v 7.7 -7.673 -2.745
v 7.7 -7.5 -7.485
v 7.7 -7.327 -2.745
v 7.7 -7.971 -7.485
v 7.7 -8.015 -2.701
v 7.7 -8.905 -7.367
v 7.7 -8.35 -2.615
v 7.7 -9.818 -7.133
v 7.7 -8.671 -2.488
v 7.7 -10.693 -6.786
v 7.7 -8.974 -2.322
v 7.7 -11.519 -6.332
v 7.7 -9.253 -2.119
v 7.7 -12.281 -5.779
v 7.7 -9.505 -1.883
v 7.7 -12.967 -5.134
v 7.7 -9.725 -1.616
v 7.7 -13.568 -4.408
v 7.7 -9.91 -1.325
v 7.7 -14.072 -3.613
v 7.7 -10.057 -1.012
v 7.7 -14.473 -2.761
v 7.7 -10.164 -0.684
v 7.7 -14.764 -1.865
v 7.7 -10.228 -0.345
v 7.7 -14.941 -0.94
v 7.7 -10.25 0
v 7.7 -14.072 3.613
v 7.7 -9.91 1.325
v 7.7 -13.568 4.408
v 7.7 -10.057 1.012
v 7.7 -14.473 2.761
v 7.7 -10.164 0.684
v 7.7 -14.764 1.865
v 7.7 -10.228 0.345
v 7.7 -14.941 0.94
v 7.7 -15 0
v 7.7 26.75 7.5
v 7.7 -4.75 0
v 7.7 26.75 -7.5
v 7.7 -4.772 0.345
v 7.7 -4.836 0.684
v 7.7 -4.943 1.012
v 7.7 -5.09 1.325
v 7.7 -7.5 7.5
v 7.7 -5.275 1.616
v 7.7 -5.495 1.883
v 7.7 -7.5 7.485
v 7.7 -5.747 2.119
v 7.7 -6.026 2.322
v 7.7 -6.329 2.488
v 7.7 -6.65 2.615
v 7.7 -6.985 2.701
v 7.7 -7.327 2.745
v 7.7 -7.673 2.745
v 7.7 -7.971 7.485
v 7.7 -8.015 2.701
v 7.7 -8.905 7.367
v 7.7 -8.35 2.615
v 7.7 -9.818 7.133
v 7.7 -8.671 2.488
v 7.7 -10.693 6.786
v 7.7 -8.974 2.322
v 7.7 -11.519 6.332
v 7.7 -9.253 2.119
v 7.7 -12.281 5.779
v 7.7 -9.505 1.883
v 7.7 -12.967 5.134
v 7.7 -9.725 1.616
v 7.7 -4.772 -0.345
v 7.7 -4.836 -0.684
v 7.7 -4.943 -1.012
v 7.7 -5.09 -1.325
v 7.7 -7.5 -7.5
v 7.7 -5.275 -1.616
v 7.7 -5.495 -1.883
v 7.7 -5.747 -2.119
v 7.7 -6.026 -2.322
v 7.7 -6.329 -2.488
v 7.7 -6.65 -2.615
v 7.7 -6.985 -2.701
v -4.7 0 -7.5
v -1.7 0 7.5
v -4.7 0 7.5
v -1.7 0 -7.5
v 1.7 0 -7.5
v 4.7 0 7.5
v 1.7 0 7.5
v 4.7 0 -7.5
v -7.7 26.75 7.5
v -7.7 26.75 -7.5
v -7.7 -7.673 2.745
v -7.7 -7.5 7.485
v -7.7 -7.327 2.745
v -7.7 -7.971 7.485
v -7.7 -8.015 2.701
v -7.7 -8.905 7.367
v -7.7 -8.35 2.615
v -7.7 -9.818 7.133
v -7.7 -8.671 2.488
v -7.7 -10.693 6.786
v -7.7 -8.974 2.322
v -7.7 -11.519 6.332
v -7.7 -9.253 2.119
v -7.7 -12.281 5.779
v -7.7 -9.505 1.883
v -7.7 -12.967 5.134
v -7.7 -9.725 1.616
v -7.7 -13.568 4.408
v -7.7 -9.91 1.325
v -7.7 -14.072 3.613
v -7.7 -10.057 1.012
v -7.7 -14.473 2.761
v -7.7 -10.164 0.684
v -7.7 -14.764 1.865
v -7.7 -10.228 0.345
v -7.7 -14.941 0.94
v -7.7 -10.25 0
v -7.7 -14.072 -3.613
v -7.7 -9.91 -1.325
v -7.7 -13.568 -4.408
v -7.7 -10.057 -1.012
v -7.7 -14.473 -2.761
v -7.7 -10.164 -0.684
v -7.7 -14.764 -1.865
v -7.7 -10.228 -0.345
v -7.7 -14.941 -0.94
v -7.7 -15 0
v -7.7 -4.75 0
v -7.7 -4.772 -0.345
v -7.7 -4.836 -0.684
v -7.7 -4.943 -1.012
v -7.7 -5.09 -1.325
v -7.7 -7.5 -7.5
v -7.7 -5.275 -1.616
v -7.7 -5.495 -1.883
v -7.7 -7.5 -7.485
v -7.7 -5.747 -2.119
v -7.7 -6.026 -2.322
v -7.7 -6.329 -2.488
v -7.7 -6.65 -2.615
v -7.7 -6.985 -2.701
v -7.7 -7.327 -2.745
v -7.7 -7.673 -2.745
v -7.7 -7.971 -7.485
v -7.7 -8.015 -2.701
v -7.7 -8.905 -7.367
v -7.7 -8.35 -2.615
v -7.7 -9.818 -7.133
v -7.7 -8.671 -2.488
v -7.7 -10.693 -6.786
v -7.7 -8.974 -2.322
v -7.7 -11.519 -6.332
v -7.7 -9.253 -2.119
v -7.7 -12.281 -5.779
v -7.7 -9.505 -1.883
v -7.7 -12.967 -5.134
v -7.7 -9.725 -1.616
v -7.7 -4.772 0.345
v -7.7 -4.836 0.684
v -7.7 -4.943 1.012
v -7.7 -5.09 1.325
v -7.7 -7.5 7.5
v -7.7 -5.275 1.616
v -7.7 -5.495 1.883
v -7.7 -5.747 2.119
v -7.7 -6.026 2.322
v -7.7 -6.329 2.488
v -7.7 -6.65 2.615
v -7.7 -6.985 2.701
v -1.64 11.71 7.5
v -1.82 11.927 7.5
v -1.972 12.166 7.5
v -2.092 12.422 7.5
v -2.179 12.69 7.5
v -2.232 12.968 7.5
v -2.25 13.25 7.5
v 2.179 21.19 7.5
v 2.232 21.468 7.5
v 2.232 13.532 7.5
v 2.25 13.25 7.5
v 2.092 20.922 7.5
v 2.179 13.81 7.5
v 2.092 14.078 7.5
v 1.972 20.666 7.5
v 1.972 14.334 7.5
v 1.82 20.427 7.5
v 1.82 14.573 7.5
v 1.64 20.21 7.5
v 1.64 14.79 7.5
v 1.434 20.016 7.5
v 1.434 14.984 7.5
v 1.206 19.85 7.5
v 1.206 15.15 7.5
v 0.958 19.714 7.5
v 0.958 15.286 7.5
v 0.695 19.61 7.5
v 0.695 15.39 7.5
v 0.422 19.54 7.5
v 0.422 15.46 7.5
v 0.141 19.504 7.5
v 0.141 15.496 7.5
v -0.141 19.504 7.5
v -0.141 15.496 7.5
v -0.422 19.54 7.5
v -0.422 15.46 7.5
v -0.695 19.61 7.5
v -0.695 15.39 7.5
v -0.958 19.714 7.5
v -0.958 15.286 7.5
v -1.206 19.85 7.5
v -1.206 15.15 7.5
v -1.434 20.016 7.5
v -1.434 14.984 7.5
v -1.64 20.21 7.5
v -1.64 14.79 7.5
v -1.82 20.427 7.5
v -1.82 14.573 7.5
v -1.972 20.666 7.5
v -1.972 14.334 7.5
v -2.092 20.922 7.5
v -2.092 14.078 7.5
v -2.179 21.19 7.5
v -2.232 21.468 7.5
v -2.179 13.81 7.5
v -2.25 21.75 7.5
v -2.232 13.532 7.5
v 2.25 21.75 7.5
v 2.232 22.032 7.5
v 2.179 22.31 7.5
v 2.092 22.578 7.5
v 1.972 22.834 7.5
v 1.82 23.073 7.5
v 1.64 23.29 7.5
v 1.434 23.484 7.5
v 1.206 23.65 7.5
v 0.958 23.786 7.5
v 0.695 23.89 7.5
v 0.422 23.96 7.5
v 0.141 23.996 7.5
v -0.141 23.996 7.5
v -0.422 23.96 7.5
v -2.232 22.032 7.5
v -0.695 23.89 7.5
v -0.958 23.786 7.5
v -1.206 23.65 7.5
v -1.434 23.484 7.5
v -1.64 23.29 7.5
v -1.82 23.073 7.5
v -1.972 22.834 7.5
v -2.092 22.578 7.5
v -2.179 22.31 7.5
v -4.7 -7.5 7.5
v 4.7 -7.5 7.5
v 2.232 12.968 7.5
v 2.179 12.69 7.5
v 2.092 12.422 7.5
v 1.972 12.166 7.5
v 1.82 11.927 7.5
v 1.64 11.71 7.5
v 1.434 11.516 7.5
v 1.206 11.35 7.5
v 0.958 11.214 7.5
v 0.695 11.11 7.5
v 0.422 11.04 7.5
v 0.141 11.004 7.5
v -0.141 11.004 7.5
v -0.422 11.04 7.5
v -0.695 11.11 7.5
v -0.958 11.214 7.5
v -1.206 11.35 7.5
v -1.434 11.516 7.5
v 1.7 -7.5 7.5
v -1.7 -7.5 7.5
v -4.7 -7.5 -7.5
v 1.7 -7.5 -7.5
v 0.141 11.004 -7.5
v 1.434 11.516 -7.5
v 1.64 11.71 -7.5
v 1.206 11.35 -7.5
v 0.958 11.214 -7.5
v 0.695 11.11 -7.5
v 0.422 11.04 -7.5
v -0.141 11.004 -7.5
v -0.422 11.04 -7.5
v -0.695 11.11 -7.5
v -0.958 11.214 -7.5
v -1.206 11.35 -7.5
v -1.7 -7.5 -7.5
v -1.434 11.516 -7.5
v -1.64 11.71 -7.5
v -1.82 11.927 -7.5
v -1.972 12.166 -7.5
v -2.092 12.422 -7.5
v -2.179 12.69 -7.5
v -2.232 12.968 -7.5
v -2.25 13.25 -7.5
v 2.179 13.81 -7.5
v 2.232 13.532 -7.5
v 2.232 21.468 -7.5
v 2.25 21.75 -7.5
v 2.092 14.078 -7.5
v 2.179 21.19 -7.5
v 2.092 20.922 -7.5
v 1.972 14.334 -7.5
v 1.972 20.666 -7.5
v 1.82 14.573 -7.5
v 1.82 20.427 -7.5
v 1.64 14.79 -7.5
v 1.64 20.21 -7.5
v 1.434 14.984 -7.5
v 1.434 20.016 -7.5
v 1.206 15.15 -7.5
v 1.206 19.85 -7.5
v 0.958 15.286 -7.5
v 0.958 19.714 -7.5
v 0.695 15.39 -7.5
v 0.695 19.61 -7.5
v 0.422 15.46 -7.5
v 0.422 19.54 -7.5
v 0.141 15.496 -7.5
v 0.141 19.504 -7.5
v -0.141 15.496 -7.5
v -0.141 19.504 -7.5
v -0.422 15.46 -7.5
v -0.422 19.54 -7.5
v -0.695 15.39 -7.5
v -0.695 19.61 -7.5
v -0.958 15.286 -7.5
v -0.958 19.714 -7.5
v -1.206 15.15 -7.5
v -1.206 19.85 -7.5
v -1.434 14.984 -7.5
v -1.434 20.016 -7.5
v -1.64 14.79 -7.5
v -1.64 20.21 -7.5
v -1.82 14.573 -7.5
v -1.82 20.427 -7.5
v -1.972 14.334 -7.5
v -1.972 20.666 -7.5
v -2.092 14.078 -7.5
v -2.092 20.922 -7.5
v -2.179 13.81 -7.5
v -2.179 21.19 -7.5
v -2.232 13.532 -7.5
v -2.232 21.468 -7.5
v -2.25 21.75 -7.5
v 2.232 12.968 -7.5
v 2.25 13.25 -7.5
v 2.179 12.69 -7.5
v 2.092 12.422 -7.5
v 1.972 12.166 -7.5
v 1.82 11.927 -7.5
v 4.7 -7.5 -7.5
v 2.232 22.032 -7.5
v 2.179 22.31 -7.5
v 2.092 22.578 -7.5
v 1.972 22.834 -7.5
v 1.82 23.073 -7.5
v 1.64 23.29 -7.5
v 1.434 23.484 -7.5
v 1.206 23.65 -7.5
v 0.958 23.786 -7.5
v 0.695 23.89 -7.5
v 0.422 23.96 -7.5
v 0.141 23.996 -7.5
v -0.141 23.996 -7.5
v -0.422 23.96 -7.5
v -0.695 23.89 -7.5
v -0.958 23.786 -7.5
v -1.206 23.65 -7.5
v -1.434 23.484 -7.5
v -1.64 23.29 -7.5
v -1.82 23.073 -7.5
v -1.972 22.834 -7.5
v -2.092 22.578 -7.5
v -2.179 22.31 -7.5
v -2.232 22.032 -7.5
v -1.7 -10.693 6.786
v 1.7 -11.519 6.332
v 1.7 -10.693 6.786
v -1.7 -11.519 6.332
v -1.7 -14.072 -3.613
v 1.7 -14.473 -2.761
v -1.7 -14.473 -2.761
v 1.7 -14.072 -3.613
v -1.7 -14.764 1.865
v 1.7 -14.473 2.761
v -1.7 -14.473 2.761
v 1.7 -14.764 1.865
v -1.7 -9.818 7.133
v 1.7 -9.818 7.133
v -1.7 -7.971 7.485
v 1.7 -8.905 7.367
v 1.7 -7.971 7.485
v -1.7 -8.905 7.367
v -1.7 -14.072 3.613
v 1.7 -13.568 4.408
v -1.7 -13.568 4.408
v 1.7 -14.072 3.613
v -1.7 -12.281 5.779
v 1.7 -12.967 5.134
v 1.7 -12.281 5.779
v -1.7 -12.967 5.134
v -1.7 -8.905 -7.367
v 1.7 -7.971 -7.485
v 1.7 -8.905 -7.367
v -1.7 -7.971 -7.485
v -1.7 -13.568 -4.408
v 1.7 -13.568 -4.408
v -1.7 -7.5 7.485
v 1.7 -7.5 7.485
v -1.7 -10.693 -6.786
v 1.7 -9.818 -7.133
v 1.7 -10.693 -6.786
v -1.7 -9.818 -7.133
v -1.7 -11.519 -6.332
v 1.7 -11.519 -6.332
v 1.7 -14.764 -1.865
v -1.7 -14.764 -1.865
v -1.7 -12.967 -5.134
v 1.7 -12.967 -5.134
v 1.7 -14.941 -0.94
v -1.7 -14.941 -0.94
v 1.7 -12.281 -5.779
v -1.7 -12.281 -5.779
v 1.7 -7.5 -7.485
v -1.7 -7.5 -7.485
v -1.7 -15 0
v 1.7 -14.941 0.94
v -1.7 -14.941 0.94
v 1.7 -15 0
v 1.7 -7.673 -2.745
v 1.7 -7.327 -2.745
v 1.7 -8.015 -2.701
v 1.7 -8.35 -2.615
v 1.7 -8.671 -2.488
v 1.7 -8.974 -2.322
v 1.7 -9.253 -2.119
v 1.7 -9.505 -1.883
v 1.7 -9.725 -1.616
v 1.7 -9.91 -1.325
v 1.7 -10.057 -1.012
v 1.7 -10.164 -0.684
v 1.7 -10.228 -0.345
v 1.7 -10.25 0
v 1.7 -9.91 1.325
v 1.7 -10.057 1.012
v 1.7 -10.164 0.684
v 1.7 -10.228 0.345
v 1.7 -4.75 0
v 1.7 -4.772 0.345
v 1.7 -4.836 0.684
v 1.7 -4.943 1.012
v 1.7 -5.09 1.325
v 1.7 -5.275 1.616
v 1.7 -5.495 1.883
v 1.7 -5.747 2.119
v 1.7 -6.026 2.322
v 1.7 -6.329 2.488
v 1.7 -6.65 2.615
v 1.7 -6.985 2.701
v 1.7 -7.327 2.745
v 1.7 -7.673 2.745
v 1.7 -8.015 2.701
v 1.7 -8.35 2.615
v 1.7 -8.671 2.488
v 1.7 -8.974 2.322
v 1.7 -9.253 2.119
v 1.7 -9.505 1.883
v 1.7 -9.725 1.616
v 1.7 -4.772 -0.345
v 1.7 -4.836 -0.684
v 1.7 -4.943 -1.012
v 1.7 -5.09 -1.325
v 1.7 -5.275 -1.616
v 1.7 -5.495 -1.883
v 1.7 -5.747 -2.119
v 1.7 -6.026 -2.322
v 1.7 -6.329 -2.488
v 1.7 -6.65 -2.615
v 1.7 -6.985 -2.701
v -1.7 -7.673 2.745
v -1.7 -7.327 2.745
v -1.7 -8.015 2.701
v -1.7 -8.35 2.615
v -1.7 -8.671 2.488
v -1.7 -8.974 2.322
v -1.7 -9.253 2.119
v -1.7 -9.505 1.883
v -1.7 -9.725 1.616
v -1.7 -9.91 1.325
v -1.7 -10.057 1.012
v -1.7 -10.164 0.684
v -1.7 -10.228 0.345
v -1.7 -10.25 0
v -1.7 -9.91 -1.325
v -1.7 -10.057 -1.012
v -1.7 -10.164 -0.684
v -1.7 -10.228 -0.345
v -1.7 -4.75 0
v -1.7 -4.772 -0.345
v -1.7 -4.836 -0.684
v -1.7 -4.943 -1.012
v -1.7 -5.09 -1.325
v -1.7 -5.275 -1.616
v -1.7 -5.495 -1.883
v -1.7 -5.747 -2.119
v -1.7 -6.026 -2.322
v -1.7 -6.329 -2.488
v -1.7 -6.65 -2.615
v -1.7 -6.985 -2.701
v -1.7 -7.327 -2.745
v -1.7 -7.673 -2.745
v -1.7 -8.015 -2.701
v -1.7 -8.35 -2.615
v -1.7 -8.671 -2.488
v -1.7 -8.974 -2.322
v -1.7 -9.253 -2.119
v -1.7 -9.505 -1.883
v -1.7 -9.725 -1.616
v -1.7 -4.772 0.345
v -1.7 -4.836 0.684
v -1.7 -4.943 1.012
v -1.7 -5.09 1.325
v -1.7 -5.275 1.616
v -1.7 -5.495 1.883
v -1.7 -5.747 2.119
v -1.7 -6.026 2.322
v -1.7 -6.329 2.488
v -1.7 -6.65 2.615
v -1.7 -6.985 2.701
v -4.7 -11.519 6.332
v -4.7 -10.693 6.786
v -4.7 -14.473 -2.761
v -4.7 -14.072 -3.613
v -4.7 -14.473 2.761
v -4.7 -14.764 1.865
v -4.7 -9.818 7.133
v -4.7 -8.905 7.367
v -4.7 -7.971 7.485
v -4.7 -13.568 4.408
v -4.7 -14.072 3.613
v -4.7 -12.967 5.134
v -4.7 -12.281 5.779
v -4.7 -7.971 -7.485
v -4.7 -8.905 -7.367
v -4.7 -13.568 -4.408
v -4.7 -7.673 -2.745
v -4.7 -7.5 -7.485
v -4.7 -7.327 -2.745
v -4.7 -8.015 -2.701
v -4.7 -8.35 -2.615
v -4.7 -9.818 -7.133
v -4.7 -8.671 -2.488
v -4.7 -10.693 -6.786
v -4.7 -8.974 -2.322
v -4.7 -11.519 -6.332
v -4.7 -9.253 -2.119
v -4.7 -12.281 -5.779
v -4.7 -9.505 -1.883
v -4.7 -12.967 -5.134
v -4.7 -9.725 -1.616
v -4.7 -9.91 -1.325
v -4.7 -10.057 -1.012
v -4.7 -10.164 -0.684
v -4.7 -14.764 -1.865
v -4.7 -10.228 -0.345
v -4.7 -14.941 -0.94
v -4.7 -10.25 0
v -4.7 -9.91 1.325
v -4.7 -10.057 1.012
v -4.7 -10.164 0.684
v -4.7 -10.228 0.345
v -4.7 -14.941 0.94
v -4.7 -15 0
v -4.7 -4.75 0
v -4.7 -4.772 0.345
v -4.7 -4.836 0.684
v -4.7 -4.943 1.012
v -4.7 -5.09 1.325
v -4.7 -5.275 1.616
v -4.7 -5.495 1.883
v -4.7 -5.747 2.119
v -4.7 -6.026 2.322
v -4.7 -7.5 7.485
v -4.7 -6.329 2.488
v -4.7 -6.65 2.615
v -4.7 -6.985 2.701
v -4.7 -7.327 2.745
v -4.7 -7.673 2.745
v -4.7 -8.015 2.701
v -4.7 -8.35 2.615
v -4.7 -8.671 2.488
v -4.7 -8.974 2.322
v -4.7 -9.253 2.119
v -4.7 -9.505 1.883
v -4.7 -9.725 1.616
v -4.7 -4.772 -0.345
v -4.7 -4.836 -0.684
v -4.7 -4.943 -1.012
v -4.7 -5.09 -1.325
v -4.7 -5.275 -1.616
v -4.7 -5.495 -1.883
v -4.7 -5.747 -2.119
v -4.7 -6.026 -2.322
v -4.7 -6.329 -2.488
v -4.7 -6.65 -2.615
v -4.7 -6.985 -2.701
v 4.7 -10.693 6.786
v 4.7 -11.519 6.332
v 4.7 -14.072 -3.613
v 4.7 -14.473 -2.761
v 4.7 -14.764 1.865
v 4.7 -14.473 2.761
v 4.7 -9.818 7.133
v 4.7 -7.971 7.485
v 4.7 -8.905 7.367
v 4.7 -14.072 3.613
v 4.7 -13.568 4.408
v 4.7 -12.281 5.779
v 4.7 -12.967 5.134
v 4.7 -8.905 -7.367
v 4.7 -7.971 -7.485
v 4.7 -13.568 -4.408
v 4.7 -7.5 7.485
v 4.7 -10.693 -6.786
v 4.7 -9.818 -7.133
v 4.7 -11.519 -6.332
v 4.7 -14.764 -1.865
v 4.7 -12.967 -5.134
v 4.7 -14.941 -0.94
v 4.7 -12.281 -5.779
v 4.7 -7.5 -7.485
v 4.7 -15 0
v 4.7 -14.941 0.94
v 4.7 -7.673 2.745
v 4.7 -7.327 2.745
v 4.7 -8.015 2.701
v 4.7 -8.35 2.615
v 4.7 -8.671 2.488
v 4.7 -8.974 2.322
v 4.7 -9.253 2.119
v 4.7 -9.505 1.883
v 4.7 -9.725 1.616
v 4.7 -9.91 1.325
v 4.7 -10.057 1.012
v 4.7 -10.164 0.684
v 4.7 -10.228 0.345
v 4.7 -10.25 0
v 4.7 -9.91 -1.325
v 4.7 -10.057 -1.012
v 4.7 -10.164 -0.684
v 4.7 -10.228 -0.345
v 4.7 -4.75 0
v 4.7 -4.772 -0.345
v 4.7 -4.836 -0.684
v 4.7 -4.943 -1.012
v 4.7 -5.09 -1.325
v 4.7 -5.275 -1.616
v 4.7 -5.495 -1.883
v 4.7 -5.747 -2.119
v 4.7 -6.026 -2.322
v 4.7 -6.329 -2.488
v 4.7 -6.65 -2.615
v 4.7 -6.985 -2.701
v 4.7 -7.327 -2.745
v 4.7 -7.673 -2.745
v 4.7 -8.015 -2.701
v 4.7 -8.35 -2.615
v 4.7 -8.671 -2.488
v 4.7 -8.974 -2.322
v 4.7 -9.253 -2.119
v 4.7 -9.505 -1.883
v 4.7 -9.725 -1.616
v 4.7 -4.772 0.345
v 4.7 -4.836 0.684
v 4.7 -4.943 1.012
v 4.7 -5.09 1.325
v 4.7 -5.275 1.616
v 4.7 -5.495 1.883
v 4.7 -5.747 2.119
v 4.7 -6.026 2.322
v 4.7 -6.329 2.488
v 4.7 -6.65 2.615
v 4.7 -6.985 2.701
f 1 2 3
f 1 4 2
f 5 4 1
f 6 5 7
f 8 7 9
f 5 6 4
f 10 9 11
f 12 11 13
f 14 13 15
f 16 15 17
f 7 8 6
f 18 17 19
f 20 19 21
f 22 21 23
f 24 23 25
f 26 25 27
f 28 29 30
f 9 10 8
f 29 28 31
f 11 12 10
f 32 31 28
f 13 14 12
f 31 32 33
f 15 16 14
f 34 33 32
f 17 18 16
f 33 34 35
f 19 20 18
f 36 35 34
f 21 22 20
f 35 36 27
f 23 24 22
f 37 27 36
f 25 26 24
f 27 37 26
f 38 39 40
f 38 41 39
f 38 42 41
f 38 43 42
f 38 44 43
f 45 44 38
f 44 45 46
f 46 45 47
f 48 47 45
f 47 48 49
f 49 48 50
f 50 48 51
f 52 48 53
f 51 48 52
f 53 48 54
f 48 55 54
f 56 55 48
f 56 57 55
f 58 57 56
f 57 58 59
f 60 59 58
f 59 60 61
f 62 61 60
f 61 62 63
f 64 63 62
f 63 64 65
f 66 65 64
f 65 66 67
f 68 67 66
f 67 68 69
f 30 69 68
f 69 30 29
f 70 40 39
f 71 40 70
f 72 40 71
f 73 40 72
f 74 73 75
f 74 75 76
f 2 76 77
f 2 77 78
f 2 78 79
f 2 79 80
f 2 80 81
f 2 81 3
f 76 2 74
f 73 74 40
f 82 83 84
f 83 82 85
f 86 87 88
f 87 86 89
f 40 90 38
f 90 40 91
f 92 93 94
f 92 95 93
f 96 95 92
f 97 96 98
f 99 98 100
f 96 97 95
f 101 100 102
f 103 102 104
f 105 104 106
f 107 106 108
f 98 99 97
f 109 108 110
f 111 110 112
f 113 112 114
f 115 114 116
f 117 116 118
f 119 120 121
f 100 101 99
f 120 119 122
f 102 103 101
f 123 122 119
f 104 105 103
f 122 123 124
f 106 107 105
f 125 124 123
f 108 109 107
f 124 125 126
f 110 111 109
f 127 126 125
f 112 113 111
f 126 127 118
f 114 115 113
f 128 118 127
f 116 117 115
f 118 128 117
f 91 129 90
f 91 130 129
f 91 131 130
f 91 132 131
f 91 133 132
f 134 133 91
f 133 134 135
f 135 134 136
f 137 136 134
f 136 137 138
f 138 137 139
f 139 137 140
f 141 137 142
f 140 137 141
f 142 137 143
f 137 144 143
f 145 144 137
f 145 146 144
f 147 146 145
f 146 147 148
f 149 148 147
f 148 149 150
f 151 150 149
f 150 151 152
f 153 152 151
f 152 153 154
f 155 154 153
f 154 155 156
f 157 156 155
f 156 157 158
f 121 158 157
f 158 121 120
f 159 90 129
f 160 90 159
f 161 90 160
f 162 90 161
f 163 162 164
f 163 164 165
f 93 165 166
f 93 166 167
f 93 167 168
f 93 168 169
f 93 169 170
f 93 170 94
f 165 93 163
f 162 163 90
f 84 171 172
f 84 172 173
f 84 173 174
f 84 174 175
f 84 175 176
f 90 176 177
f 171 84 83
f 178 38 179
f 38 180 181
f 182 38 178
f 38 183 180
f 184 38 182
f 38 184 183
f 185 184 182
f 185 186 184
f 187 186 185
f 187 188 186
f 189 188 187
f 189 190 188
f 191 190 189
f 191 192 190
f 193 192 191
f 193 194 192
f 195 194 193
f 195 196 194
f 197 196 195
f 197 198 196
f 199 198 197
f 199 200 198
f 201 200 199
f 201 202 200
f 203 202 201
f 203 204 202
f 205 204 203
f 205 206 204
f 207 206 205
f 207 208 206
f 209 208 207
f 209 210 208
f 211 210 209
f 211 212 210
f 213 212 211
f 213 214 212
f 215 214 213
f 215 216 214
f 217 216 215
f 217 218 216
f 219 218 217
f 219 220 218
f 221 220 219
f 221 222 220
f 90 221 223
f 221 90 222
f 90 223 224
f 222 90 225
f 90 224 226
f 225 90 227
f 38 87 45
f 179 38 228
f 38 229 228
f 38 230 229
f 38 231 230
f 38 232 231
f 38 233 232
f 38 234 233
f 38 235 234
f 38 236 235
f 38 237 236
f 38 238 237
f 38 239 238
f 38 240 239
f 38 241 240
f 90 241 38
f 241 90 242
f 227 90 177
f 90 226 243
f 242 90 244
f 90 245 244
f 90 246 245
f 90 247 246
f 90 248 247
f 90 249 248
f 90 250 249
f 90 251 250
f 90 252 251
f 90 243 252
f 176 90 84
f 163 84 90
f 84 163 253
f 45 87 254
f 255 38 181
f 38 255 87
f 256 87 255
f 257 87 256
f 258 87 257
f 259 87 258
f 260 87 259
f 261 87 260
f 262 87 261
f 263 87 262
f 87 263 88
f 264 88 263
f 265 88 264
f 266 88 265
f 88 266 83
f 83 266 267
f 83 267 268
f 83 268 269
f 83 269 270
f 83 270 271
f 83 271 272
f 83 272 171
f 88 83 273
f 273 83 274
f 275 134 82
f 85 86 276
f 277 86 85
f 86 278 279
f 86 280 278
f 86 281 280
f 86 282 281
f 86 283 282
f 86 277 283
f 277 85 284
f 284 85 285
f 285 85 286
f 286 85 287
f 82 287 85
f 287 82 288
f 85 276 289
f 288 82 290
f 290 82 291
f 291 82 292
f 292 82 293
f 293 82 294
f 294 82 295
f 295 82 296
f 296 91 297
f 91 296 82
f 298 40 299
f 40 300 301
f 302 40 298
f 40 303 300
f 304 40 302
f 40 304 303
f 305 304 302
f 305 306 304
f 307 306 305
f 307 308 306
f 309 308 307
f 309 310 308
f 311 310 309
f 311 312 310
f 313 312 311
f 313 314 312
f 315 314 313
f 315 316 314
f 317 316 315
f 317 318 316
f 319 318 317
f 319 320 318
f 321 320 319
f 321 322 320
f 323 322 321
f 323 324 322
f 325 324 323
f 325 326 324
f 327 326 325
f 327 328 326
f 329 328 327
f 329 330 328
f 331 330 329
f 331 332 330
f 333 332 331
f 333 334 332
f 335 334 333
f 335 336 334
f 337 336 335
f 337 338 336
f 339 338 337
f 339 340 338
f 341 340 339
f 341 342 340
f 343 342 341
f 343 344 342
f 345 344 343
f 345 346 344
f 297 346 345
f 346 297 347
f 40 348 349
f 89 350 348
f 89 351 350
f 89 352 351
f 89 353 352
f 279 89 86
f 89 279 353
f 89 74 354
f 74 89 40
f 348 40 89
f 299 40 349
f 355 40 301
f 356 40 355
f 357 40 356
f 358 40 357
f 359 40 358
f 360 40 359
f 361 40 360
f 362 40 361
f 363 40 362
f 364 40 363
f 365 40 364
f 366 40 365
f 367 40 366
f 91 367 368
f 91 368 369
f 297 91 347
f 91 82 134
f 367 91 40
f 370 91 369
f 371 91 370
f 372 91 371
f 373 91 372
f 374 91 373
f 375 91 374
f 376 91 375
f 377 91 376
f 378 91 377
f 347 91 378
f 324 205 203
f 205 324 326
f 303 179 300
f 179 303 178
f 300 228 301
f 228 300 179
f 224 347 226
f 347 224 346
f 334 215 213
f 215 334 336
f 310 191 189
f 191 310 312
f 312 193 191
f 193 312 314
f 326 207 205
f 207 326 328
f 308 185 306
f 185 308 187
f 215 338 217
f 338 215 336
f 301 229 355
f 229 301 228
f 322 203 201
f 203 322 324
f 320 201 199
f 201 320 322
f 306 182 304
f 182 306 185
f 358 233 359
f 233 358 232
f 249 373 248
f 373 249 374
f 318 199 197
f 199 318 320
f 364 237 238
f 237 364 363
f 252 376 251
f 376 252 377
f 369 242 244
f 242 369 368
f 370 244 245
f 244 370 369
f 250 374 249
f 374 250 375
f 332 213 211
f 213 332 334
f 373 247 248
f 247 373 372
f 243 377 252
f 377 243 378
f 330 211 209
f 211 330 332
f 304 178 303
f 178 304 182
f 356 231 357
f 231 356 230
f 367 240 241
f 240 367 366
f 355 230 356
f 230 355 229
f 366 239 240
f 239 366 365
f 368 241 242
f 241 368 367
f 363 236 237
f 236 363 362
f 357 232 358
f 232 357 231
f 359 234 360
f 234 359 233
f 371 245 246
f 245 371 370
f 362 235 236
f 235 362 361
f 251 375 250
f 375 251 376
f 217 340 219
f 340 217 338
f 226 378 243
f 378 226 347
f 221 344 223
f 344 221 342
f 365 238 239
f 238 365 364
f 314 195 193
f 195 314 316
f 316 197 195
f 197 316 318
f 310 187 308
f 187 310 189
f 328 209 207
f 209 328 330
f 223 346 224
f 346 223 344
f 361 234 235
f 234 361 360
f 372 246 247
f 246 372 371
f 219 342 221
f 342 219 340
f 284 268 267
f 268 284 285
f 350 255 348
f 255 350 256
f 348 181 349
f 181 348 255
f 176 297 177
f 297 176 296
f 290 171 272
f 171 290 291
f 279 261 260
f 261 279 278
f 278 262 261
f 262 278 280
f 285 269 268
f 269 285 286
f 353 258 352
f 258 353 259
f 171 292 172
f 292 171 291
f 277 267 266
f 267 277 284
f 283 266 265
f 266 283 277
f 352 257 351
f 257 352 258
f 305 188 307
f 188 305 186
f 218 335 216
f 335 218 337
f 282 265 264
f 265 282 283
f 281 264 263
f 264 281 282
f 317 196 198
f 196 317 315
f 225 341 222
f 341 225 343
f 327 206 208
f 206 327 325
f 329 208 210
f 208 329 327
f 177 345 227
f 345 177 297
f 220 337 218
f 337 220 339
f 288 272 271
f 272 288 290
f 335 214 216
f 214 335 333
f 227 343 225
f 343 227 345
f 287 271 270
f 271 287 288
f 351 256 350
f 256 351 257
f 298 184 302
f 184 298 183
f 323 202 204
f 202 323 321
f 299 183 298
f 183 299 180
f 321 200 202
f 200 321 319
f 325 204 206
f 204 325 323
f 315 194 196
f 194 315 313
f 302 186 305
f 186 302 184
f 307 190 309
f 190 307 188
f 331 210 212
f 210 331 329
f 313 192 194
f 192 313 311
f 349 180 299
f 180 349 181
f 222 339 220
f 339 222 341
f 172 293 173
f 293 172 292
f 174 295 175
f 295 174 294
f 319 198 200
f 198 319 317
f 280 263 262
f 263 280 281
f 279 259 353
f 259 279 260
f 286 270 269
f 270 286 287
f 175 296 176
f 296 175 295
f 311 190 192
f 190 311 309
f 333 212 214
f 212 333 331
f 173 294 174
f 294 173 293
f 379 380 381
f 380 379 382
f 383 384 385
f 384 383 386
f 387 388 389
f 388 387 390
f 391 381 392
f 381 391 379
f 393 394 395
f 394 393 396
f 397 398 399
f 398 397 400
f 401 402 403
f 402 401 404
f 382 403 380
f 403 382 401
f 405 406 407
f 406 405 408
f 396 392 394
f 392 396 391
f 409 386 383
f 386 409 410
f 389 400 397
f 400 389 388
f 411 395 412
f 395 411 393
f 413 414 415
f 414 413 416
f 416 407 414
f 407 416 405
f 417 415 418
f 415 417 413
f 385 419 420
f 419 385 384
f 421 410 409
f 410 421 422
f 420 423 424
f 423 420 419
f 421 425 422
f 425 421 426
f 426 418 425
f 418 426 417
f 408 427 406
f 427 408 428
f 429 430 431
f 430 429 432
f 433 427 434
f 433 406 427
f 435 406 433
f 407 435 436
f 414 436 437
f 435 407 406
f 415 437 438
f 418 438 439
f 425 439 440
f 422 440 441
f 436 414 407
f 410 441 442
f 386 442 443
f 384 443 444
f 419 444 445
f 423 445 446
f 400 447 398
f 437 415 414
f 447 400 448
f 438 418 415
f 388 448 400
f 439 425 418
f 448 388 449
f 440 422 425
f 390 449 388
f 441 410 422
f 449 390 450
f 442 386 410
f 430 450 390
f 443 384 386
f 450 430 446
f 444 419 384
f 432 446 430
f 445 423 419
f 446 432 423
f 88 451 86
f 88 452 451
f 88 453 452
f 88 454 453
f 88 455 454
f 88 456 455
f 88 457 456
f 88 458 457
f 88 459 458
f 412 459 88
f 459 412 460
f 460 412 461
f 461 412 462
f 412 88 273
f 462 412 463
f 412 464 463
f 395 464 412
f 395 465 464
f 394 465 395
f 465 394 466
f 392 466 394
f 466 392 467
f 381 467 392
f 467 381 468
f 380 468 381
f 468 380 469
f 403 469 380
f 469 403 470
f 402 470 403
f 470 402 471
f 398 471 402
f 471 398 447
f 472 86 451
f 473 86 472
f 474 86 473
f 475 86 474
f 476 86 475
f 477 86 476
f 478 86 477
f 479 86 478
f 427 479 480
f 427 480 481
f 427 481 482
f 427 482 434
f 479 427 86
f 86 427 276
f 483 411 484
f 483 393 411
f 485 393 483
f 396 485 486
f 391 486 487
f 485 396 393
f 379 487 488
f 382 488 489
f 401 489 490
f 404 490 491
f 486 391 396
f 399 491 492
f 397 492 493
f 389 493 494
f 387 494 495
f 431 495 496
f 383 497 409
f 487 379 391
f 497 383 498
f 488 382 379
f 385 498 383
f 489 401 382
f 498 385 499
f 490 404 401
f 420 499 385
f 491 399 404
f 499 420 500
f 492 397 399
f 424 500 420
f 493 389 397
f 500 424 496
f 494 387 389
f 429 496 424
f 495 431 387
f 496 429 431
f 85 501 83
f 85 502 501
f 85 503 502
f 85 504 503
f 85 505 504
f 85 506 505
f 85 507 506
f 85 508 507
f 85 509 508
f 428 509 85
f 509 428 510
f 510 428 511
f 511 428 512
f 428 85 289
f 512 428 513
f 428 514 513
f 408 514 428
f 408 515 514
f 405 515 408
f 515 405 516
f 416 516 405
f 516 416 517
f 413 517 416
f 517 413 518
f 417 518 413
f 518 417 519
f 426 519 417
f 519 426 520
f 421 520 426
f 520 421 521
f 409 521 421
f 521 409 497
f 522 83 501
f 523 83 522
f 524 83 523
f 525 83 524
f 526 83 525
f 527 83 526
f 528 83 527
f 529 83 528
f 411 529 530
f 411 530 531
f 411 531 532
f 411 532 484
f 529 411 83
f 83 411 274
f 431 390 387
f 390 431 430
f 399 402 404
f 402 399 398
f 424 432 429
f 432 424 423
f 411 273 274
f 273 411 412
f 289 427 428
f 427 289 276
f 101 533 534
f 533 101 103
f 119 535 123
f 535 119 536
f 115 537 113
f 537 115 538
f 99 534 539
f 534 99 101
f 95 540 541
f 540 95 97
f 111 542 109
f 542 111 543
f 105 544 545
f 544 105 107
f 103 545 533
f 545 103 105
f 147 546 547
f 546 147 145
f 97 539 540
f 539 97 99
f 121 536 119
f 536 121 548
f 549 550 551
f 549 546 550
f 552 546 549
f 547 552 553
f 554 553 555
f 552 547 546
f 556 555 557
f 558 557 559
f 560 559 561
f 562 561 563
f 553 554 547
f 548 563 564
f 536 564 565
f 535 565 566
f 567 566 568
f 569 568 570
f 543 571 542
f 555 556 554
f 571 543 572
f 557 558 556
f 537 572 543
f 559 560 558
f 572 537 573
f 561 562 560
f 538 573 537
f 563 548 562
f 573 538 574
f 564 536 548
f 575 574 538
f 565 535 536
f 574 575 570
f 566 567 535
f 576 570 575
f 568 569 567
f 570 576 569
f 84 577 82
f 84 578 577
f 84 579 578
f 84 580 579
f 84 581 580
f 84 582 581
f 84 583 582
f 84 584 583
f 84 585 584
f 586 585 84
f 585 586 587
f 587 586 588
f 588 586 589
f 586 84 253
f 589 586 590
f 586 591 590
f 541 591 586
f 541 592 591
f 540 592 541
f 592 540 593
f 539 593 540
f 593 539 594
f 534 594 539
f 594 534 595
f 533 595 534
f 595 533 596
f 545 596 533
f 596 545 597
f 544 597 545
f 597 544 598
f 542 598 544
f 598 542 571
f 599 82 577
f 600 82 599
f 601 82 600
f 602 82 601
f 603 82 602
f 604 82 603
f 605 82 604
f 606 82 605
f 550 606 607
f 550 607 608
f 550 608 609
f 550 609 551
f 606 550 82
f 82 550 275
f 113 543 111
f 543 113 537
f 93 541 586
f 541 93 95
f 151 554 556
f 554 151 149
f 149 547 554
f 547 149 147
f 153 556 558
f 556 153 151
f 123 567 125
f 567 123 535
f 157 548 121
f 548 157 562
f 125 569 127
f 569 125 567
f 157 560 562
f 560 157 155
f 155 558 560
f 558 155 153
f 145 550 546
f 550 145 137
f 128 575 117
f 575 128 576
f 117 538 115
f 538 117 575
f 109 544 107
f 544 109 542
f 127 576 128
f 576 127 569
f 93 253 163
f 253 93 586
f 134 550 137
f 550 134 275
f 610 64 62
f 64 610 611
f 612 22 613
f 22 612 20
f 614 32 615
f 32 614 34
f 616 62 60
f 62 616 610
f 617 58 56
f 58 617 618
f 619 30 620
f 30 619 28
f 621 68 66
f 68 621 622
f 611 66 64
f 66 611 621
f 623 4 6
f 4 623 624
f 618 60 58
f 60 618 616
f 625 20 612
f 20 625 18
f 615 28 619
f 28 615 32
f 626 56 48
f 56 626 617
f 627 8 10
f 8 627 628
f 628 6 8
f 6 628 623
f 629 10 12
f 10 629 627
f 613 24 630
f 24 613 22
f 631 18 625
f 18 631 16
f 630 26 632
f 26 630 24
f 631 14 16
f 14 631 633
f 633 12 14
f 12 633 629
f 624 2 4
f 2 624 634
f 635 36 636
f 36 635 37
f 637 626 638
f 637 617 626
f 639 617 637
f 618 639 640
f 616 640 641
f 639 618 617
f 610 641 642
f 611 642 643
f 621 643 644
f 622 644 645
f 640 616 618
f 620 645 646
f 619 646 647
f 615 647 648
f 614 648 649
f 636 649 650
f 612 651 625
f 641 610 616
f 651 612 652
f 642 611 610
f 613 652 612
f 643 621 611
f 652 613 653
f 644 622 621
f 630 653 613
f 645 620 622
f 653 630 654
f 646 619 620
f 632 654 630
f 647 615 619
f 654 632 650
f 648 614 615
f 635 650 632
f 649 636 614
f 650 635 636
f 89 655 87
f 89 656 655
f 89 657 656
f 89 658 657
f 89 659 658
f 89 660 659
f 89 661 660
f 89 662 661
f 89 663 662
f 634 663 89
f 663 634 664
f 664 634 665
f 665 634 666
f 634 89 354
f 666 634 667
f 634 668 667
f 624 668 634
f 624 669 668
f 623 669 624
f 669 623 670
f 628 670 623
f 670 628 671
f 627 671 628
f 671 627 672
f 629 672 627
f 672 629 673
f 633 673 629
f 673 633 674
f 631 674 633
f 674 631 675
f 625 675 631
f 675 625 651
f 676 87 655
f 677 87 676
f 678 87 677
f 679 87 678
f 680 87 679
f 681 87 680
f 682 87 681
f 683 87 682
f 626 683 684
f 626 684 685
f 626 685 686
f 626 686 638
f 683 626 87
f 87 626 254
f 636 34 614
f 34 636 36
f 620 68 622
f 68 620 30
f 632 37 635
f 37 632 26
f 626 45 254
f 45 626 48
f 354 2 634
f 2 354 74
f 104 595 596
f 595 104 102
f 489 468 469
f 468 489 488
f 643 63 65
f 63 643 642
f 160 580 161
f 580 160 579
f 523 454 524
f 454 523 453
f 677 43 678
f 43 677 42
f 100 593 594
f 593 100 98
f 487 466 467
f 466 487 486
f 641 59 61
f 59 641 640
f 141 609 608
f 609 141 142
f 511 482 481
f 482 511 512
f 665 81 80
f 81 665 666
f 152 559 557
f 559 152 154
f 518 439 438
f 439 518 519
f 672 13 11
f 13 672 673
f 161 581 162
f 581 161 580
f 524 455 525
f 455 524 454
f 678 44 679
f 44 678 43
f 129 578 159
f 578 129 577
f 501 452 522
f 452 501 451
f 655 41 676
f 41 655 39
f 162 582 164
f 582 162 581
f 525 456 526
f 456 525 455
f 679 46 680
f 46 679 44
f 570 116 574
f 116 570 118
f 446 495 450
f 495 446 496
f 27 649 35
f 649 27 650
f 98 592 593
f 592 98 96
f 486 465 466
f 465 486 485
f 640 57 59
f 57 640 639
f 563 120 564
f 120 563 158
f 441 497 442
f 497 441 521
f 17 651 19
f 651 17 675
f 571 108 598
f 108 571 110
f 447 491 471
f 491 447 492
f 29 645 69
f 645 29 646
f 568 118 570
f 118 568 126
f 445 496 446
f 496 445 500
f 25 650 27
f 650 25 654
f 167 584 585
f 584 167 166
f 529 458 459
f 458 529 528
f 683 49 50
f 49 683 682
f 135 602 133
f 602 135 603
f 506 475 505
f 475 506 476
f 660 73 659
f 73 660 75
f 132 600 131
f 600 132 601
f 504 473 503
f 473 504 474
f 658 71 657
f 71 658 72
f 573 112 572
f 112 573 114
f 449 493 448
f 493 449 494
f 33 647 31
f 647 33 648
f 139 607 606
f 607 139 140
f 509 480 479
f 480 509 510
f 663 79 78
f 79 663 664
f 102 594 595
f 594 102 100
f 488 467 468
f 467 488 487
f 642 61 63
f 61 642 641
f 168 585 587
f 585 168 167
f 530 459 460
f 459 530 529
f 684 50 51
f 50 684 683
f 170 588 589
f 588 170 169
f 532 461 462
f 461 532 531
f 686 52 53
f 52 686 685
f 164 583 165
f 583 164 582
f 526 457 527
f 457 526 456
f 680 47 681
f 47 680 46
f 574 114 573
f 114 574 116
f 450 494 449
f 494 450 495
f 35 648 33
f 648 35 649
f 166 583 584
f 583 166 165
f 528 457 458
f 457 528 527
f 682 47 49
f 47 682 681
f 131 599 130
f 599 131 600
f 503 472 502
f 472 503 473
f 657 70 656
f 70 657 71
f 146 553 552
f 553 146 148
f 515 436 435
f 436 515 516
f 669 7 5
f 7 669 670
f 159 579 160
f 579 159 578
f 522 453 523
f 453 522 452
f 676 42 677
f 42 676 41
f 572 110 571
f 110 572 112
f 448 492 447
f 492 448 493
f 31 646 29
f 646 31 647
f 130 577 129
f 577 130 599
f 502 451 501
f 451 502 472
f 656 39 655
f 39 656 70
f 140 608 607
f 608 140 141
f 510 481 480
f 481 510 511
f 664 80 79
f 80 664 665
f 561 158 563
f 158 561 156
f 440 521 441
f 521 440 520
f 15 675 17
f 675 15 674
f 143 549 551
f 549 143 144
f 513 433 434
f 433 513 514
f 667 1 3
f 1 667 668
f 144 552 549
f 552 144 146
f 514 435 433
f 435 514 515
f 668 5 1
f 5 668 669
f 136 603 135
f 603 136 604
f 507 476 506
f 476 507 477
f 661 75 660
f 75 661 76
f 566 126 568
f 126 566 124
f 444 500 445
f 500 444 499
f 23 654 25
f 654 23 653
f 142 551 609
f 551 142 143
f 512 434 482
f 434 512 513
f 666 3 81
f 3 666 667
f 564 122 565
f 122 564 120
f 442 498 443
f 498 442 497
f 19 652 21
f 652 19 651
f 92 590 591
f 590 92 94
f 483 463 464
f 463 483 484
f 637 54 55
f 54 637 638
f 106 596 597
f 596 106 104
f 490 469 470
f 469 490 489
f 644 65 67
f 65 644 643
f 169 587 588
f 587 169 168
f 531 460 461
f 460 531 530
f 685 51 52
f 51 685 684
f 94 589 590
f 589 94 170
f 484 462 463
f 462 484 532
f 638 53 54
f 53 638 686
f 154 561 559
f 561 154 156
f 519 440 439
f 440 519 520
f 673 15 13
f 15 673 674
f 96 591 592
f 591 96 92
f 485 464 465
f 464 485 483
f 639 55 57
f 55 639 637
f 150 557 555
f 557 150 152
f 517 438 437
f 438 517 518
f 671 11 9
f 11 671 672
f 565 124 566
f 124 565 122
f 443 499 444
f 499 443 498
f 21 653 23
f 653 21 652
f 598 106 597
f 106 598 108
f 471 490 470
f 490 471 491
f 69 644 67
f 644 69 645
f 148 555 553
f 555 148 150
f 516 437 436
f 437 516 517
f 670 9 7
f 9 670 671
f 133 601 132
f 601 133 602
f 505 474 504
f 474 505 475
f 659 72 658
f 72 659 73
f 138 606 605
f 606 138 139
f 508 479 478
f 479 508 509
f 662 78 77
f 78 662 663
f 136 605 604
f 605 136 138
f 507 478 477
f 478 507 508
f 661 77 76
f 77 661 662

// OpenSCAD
//**********************************************************************************************
//This is my attempt at a GoPro3 mount for my Quadcopter (Dualsky Hornet 460)
//It has been designed to be printable without support and strong
//By specifying the extrusion width you will be printing and setting perimeters to 3 (in slic3r)
//printing will be pretty quick.
//**********************************************************************************************

$fn=50;

//layer height used when printing
layerHeight=.3;

//extrusionwidth to use when printing
extrusionWidth=.7;

//Camera Dimensions
//I have added 2mm to camera dimensions to allow for padding
//to be inserted
cameraLength=61;
cameraWidth=23;
cameraHeight=43;
cameraLenseHeight=8;
cameraLenseDiameter=25;

//located 27.5mm from the bottom and 44.5mm from the left edge	 on my gopro3
lenseXOffset=-(44.5-cameraLength/2);
lenseZOffset=28-cameraHeight/2;

//Base to be mounted on top plate of hornet 469. Not used but may need it in future on
baseSupportDiameter=10;
baseSupportHeight=10;
baseSupportScrewDiameter=4.5;
	
//Thickness of walls. Increase to make stronger
wallThickness=4*extrusionWidth;

//Dimensions for GoPro hinge
hingeDiameter=15;
hingeThickness=3;
hingeGap=3.4;
hingeBoltDiameter=5.5;
hingeYOffset=(cameraWidth+2*wallThickness-hingeDiameter)/2;
	
//Back door securing tab dimensions
tabDiameter=10;
tabScrewDiameter=3.5;	
RHStabOffset=10;

//Arm to attach gopro mount to hornet 460
bracketLength=25;
bracketHoleSpacing=8.5;
bracketScrewDiameter=4.5;

//Opening for USB plug (for FPV)
usbPlugLength=wallThickness+.1;
usbPlugWidth=15;
usbPlugHeight=13;

tolerance=.0001;

//model of camera
module hero3()
{
	//body of camera
	cube([cameraLength,cameraWidth,cameraHeight],true);

	//lense of camera
	translate([lenseXOffset,cameraWidth/2,lenseZOffset])
	rotate([-90,0,0])
	cylinder(cameraLenseHeight,cameraLenseDiameter/2,cameraLenseDiameter/2);
}

//space needed for usb plug
module usbPlugCutout()
{
	//	rotate([180,0,0])s
	//usb plug locate 5mm from front and 10mm from bottom
	translate([-cameraLength/2-usbPlugLength/2,-(usbPlugWidth/2-cameraWidth/2+3),10-cameraHeight/2])
	cube([usbPlugLength,usbPlugWidth,usbPlugHeight],true);
}

module mountingBracket()
{
	difference()
	{
		//main shaft	
		translate([0,0,-(bracketLength-hingeDiameter/2+bracketHoleSpacing/2+5)/2])
		cube([hingeThickness*4+hingeGap,hingeDiameter,bracketLength-hingeDiameter/2+bracketHoleSpacing/2+5],true);
	
		//minus mounting screws
		translate([0,0,-(bracketLength-hingeDiameter/2+bracketHoleSpacing/2)])
		rotate([90,0,0])
		cylinder(hingeDiameter+tolerance,bracketScrewDiameter/2,bracketScrewDiameter/2,true);

		translate([0,0,-(bracketLength-hingeDiameter/2-bracketHoleSpacing/2)])
		rotate([90,0,0])
		cylinder(hingeDiameter+tolerance,bracketScrewDiameter/2,bracketScrewDiameter/2,true);

	}	

	difference()
	{
		union()
		{
				//hinge cylinder middle
				translate([0,0,hingeDiameter/2])	
				rotate([0,90,0])
				cylinder(hingeGap,hingeDiameter/2,hingeDiameter/2,true);

				//hinge cylinder bottombit middle
				translate([0,0,hingeDiameter/4])
				cube([hingeGap,hingeDiameter,hingeDiameter/2],true);

				//hinge cylinder RHS
				translate([-(hingeThickness*2+(hingeGap-hingeThickness)/2),0,hingeDiameter/2])	
				rotate([0,90,0])
				cylinder(hingeThickness,hingeDiameter/2,hingeDiameter/2,true);

				//hinge cylinder bottombit RHS
				translate([-(hingeThickness*2+(hingeGap-hingeThickness)/2),0,hingeDiameter/4])
				cube([hingeThickness,hingeDiameter,hingeDiameter/2],true);

				//hinge cylinder LHS
				translate([(hingeThickness*2+(hingeGap-hingeThickness)/2),0,hingeDiameter/2])	
				rotate([0,90,0])
				cylinder(hingeThickness,hingeDiameter/2,hingeDiameter/2,true);

				//hinge cylinder bottombit LHS
				translate([(hingeThickness*2+(hingeGap-hingeThickness)/2),0,hingeDiameter/4])
				cube([hingeThickness,hingeDiameter,hingeDiameter/2],true);
		}
		//minus screw hole
		translate([0,0,hingeDiameter/2])
		rotate([0,90,0])
		cylinder(hingeThickness*4+hingeGap+tolerance,hingeBoltDiameter/2,hingeBoltDiameter/2,true);

	}//difference
}
module hinge()
{
	translate([(lenseXOffset),wallThickness,cameraHeight/2+wallThickness])
	{
	
		difference()
		{
			union()
			{
				//hinge cylinder LHS
				translate([hingeThickness/2+hingeGap/2,-hingeYOffset,hingeDiameter/2])	
				rotate([0,90,0])
				cylinder(hingeThickness,hingeDiameter/2,hingeDiameter/2,true);

				//hinge cylinder bottombit LHS
				translate([hingeThickness/2+hingeGap/2,-hingeYOffset,hingeDiameter/4])
				cube([hingeThickness,hingeDiameter,hingeDiameter/2],true);

				//hinge cylinder RHS
				translate([-(hingeThickness/2+hingeGap/2),-hingeYOffset,hingeDiameter/2])	
				rotate([0,90,0])
				cylinder(hingeThickness,hingeDiameter/2,hingeDiameter/2,true);

				//hinge cylinder bottombit RHS
				translate([-(hingeThickness/2+hingeGap/2),-hingeYOffset,hingeDiameter/4])
				cube([hingeThickness,hingeDiameter,hingeDiameter/2],true);
			}

		translate([0,-hingeYOffset,hingeDiameter/2])
		rotate([0,90,0])
		cylinder(hingeThickness*2+hingeGap+tolerance,hingeBoltDiameter/2,hingeBoltDiameter/2,true);
		}
	}
	
}
module case()
{
	difference()
	{
		cube([cameraLength+wallThickness*2,cameraWidth+wallThickness*2,cameraHeight+wallThickness*2],true);
		translate([0,-wallThickness,0])

	
		usbPlugCutout();
		hero3();

	}
		//added geom for lense hole to avoid support material
	translate([lenseXOffset,cameraWidth/2,lenseZOffset])
	rotate([-90,0,0])
	cylinder(layerHeight,cameraLenseDiameter/2,cameraLenseDiameter/2);

	//LHS tab to attach back lid to
	translate([(cameraLength/2+wallThickness+tabDiameter/2),-(cameraWidth/2),0])
	{
		difference()
		{
			union()
			{
				rotate([90,0,0])
				cylinder(wallThickness*2,tabDiameter/2,tabDiameter/2,true);
				translate([-tabDiameter/4,0,0])
				cube([tabDiameter/2,wallThickness*2,tabDiameter],true);
			}

			//screw hole
			rotate([90,0,0])
			cylinder(wallThickness*2+tolerance,tabScrewDiameter/2,tabScrewDiameter/2,true);
		}
	}

	//RHS tab to attach back lid to
	translate([-(cameraLength/2+wallThickness+tabDiameter/2),-(cameraWidth/2),RHStabOffset])
	{
		rotate([0,180,0])
		{
		difference()
		{
			union()
			{
				rotate([90,0,0])
				cylinder(wallThickness*2,tabDiameter/2,tabDiameter/2,true);
				translate([-tabDiameter/4,0,0])
				cube([tabDiameter/2,wallThickness*2,tabDiameter],true);
			}

			//screw hole
			rotate([90,0,0])
			cylinder(wallThickness*2+tolerance,tabScrewDiameter/2,tabScrewDiameter/2,true);
		}
	}
}
	
	//Bottom tab to attach back lid to
	translate([0,-(cameraWidth/2),-(cameraHeight/2+wallThickness+tabDiameter/2)])
	{
		rotate([0,90,0])
		{
		difference()
		{
			union()
			{
				rotate([90,0,0])
				#cylinder(wallThickness*2,tabDiameter/2,tabDiameter/2,true);
				translate([-tabDiameter/4,0,0])
				#cube([tabDiameter/2,wallThickness*2,tabDiameter],true);
			}

			//screw hole
			rotate([90,0,0])
			#cylinder(wallThickness*2+tolerance,tabScrewDiameter/2,tabScrewDiameter/2,true);
		}
		}
	}

}


//base to mount to top plate of hornet 460
module bracketBase()
{


	//standoffs to allow flight controller to fit underneath
	rotate([0,0,0])
	translate([90/2,0,0])
	mountingHolePairs();
	
	rotate([0,0,90])
	translate([90/2,0,0])
	mountingHolePairs();

	rotate([0,0,180])
	translate([90/2,0,0])
	mountingHolePairs();

	rotate([0,0,270])
	translate([90/2,0,0])
	mountingHolePairs();
	
	//base of camera mounting plate
	translate([0,0,baseSupportHeight])
	cylinder(wallThickness,90/2+baseSupportDiameter,90/2+baseSupportDiameter);


}
//used in bracketBase()
module mountingHolePairs()
{
	//holes in top plate for screwing this contraption to are located
	//in pairs at 36mm hole centers.
	//these pairs are located 90mm apart	
	//need to look at top support with a ruler for this to make sense
	translate([0,36/2,0])
	difference()
	{
	cylinder(baseSupportHeight,baseSupportDiameter/2,baseSupportDiameter/2);
	//hole for screw thread to be tapped into
	cylinder(baseSupportHeight,baseSupportScrewDiameter/2,baseSupportScrewDiameter/2);
	}
	translate([0,-36/2,0])
	difference()
	{
	cylinder(baseSupportHeight,baseSupportDiameter/2,baseSupportDiameter/2);
	//hole for screw thread to be tapped into
	cylinder(baseSupportHeight,baseSupportScrewDiameter/2,baseSupportScrewDiameter/2);
	}
}

module caseBackDoor()
{
	intersection()
	{
		case();
		translate([0,-(cameraWidth/2+wallThickness/2),0])
		cube([cameraLength+2*wallThickness+tabDiameter*2+tolerance,wallThickness+tolerance,cameraHeight+2*wallThickness+tabDiameter*2+tolerance],true);
	}
}

module caseFront()
{
	difference()
	{
		union()
		{
		case();
		hinge();
		}
		translate([0,-(cameraWidth/2+wallThickness/2),0])
		cube([cameraLength+2*wallThickness+tabDiameter*2,wallThickness+.0001,cameraHeight+2*wallThickness+tabDiameter*2],true);
	}
}

rotate([90,0,0])
mountingBracket();
